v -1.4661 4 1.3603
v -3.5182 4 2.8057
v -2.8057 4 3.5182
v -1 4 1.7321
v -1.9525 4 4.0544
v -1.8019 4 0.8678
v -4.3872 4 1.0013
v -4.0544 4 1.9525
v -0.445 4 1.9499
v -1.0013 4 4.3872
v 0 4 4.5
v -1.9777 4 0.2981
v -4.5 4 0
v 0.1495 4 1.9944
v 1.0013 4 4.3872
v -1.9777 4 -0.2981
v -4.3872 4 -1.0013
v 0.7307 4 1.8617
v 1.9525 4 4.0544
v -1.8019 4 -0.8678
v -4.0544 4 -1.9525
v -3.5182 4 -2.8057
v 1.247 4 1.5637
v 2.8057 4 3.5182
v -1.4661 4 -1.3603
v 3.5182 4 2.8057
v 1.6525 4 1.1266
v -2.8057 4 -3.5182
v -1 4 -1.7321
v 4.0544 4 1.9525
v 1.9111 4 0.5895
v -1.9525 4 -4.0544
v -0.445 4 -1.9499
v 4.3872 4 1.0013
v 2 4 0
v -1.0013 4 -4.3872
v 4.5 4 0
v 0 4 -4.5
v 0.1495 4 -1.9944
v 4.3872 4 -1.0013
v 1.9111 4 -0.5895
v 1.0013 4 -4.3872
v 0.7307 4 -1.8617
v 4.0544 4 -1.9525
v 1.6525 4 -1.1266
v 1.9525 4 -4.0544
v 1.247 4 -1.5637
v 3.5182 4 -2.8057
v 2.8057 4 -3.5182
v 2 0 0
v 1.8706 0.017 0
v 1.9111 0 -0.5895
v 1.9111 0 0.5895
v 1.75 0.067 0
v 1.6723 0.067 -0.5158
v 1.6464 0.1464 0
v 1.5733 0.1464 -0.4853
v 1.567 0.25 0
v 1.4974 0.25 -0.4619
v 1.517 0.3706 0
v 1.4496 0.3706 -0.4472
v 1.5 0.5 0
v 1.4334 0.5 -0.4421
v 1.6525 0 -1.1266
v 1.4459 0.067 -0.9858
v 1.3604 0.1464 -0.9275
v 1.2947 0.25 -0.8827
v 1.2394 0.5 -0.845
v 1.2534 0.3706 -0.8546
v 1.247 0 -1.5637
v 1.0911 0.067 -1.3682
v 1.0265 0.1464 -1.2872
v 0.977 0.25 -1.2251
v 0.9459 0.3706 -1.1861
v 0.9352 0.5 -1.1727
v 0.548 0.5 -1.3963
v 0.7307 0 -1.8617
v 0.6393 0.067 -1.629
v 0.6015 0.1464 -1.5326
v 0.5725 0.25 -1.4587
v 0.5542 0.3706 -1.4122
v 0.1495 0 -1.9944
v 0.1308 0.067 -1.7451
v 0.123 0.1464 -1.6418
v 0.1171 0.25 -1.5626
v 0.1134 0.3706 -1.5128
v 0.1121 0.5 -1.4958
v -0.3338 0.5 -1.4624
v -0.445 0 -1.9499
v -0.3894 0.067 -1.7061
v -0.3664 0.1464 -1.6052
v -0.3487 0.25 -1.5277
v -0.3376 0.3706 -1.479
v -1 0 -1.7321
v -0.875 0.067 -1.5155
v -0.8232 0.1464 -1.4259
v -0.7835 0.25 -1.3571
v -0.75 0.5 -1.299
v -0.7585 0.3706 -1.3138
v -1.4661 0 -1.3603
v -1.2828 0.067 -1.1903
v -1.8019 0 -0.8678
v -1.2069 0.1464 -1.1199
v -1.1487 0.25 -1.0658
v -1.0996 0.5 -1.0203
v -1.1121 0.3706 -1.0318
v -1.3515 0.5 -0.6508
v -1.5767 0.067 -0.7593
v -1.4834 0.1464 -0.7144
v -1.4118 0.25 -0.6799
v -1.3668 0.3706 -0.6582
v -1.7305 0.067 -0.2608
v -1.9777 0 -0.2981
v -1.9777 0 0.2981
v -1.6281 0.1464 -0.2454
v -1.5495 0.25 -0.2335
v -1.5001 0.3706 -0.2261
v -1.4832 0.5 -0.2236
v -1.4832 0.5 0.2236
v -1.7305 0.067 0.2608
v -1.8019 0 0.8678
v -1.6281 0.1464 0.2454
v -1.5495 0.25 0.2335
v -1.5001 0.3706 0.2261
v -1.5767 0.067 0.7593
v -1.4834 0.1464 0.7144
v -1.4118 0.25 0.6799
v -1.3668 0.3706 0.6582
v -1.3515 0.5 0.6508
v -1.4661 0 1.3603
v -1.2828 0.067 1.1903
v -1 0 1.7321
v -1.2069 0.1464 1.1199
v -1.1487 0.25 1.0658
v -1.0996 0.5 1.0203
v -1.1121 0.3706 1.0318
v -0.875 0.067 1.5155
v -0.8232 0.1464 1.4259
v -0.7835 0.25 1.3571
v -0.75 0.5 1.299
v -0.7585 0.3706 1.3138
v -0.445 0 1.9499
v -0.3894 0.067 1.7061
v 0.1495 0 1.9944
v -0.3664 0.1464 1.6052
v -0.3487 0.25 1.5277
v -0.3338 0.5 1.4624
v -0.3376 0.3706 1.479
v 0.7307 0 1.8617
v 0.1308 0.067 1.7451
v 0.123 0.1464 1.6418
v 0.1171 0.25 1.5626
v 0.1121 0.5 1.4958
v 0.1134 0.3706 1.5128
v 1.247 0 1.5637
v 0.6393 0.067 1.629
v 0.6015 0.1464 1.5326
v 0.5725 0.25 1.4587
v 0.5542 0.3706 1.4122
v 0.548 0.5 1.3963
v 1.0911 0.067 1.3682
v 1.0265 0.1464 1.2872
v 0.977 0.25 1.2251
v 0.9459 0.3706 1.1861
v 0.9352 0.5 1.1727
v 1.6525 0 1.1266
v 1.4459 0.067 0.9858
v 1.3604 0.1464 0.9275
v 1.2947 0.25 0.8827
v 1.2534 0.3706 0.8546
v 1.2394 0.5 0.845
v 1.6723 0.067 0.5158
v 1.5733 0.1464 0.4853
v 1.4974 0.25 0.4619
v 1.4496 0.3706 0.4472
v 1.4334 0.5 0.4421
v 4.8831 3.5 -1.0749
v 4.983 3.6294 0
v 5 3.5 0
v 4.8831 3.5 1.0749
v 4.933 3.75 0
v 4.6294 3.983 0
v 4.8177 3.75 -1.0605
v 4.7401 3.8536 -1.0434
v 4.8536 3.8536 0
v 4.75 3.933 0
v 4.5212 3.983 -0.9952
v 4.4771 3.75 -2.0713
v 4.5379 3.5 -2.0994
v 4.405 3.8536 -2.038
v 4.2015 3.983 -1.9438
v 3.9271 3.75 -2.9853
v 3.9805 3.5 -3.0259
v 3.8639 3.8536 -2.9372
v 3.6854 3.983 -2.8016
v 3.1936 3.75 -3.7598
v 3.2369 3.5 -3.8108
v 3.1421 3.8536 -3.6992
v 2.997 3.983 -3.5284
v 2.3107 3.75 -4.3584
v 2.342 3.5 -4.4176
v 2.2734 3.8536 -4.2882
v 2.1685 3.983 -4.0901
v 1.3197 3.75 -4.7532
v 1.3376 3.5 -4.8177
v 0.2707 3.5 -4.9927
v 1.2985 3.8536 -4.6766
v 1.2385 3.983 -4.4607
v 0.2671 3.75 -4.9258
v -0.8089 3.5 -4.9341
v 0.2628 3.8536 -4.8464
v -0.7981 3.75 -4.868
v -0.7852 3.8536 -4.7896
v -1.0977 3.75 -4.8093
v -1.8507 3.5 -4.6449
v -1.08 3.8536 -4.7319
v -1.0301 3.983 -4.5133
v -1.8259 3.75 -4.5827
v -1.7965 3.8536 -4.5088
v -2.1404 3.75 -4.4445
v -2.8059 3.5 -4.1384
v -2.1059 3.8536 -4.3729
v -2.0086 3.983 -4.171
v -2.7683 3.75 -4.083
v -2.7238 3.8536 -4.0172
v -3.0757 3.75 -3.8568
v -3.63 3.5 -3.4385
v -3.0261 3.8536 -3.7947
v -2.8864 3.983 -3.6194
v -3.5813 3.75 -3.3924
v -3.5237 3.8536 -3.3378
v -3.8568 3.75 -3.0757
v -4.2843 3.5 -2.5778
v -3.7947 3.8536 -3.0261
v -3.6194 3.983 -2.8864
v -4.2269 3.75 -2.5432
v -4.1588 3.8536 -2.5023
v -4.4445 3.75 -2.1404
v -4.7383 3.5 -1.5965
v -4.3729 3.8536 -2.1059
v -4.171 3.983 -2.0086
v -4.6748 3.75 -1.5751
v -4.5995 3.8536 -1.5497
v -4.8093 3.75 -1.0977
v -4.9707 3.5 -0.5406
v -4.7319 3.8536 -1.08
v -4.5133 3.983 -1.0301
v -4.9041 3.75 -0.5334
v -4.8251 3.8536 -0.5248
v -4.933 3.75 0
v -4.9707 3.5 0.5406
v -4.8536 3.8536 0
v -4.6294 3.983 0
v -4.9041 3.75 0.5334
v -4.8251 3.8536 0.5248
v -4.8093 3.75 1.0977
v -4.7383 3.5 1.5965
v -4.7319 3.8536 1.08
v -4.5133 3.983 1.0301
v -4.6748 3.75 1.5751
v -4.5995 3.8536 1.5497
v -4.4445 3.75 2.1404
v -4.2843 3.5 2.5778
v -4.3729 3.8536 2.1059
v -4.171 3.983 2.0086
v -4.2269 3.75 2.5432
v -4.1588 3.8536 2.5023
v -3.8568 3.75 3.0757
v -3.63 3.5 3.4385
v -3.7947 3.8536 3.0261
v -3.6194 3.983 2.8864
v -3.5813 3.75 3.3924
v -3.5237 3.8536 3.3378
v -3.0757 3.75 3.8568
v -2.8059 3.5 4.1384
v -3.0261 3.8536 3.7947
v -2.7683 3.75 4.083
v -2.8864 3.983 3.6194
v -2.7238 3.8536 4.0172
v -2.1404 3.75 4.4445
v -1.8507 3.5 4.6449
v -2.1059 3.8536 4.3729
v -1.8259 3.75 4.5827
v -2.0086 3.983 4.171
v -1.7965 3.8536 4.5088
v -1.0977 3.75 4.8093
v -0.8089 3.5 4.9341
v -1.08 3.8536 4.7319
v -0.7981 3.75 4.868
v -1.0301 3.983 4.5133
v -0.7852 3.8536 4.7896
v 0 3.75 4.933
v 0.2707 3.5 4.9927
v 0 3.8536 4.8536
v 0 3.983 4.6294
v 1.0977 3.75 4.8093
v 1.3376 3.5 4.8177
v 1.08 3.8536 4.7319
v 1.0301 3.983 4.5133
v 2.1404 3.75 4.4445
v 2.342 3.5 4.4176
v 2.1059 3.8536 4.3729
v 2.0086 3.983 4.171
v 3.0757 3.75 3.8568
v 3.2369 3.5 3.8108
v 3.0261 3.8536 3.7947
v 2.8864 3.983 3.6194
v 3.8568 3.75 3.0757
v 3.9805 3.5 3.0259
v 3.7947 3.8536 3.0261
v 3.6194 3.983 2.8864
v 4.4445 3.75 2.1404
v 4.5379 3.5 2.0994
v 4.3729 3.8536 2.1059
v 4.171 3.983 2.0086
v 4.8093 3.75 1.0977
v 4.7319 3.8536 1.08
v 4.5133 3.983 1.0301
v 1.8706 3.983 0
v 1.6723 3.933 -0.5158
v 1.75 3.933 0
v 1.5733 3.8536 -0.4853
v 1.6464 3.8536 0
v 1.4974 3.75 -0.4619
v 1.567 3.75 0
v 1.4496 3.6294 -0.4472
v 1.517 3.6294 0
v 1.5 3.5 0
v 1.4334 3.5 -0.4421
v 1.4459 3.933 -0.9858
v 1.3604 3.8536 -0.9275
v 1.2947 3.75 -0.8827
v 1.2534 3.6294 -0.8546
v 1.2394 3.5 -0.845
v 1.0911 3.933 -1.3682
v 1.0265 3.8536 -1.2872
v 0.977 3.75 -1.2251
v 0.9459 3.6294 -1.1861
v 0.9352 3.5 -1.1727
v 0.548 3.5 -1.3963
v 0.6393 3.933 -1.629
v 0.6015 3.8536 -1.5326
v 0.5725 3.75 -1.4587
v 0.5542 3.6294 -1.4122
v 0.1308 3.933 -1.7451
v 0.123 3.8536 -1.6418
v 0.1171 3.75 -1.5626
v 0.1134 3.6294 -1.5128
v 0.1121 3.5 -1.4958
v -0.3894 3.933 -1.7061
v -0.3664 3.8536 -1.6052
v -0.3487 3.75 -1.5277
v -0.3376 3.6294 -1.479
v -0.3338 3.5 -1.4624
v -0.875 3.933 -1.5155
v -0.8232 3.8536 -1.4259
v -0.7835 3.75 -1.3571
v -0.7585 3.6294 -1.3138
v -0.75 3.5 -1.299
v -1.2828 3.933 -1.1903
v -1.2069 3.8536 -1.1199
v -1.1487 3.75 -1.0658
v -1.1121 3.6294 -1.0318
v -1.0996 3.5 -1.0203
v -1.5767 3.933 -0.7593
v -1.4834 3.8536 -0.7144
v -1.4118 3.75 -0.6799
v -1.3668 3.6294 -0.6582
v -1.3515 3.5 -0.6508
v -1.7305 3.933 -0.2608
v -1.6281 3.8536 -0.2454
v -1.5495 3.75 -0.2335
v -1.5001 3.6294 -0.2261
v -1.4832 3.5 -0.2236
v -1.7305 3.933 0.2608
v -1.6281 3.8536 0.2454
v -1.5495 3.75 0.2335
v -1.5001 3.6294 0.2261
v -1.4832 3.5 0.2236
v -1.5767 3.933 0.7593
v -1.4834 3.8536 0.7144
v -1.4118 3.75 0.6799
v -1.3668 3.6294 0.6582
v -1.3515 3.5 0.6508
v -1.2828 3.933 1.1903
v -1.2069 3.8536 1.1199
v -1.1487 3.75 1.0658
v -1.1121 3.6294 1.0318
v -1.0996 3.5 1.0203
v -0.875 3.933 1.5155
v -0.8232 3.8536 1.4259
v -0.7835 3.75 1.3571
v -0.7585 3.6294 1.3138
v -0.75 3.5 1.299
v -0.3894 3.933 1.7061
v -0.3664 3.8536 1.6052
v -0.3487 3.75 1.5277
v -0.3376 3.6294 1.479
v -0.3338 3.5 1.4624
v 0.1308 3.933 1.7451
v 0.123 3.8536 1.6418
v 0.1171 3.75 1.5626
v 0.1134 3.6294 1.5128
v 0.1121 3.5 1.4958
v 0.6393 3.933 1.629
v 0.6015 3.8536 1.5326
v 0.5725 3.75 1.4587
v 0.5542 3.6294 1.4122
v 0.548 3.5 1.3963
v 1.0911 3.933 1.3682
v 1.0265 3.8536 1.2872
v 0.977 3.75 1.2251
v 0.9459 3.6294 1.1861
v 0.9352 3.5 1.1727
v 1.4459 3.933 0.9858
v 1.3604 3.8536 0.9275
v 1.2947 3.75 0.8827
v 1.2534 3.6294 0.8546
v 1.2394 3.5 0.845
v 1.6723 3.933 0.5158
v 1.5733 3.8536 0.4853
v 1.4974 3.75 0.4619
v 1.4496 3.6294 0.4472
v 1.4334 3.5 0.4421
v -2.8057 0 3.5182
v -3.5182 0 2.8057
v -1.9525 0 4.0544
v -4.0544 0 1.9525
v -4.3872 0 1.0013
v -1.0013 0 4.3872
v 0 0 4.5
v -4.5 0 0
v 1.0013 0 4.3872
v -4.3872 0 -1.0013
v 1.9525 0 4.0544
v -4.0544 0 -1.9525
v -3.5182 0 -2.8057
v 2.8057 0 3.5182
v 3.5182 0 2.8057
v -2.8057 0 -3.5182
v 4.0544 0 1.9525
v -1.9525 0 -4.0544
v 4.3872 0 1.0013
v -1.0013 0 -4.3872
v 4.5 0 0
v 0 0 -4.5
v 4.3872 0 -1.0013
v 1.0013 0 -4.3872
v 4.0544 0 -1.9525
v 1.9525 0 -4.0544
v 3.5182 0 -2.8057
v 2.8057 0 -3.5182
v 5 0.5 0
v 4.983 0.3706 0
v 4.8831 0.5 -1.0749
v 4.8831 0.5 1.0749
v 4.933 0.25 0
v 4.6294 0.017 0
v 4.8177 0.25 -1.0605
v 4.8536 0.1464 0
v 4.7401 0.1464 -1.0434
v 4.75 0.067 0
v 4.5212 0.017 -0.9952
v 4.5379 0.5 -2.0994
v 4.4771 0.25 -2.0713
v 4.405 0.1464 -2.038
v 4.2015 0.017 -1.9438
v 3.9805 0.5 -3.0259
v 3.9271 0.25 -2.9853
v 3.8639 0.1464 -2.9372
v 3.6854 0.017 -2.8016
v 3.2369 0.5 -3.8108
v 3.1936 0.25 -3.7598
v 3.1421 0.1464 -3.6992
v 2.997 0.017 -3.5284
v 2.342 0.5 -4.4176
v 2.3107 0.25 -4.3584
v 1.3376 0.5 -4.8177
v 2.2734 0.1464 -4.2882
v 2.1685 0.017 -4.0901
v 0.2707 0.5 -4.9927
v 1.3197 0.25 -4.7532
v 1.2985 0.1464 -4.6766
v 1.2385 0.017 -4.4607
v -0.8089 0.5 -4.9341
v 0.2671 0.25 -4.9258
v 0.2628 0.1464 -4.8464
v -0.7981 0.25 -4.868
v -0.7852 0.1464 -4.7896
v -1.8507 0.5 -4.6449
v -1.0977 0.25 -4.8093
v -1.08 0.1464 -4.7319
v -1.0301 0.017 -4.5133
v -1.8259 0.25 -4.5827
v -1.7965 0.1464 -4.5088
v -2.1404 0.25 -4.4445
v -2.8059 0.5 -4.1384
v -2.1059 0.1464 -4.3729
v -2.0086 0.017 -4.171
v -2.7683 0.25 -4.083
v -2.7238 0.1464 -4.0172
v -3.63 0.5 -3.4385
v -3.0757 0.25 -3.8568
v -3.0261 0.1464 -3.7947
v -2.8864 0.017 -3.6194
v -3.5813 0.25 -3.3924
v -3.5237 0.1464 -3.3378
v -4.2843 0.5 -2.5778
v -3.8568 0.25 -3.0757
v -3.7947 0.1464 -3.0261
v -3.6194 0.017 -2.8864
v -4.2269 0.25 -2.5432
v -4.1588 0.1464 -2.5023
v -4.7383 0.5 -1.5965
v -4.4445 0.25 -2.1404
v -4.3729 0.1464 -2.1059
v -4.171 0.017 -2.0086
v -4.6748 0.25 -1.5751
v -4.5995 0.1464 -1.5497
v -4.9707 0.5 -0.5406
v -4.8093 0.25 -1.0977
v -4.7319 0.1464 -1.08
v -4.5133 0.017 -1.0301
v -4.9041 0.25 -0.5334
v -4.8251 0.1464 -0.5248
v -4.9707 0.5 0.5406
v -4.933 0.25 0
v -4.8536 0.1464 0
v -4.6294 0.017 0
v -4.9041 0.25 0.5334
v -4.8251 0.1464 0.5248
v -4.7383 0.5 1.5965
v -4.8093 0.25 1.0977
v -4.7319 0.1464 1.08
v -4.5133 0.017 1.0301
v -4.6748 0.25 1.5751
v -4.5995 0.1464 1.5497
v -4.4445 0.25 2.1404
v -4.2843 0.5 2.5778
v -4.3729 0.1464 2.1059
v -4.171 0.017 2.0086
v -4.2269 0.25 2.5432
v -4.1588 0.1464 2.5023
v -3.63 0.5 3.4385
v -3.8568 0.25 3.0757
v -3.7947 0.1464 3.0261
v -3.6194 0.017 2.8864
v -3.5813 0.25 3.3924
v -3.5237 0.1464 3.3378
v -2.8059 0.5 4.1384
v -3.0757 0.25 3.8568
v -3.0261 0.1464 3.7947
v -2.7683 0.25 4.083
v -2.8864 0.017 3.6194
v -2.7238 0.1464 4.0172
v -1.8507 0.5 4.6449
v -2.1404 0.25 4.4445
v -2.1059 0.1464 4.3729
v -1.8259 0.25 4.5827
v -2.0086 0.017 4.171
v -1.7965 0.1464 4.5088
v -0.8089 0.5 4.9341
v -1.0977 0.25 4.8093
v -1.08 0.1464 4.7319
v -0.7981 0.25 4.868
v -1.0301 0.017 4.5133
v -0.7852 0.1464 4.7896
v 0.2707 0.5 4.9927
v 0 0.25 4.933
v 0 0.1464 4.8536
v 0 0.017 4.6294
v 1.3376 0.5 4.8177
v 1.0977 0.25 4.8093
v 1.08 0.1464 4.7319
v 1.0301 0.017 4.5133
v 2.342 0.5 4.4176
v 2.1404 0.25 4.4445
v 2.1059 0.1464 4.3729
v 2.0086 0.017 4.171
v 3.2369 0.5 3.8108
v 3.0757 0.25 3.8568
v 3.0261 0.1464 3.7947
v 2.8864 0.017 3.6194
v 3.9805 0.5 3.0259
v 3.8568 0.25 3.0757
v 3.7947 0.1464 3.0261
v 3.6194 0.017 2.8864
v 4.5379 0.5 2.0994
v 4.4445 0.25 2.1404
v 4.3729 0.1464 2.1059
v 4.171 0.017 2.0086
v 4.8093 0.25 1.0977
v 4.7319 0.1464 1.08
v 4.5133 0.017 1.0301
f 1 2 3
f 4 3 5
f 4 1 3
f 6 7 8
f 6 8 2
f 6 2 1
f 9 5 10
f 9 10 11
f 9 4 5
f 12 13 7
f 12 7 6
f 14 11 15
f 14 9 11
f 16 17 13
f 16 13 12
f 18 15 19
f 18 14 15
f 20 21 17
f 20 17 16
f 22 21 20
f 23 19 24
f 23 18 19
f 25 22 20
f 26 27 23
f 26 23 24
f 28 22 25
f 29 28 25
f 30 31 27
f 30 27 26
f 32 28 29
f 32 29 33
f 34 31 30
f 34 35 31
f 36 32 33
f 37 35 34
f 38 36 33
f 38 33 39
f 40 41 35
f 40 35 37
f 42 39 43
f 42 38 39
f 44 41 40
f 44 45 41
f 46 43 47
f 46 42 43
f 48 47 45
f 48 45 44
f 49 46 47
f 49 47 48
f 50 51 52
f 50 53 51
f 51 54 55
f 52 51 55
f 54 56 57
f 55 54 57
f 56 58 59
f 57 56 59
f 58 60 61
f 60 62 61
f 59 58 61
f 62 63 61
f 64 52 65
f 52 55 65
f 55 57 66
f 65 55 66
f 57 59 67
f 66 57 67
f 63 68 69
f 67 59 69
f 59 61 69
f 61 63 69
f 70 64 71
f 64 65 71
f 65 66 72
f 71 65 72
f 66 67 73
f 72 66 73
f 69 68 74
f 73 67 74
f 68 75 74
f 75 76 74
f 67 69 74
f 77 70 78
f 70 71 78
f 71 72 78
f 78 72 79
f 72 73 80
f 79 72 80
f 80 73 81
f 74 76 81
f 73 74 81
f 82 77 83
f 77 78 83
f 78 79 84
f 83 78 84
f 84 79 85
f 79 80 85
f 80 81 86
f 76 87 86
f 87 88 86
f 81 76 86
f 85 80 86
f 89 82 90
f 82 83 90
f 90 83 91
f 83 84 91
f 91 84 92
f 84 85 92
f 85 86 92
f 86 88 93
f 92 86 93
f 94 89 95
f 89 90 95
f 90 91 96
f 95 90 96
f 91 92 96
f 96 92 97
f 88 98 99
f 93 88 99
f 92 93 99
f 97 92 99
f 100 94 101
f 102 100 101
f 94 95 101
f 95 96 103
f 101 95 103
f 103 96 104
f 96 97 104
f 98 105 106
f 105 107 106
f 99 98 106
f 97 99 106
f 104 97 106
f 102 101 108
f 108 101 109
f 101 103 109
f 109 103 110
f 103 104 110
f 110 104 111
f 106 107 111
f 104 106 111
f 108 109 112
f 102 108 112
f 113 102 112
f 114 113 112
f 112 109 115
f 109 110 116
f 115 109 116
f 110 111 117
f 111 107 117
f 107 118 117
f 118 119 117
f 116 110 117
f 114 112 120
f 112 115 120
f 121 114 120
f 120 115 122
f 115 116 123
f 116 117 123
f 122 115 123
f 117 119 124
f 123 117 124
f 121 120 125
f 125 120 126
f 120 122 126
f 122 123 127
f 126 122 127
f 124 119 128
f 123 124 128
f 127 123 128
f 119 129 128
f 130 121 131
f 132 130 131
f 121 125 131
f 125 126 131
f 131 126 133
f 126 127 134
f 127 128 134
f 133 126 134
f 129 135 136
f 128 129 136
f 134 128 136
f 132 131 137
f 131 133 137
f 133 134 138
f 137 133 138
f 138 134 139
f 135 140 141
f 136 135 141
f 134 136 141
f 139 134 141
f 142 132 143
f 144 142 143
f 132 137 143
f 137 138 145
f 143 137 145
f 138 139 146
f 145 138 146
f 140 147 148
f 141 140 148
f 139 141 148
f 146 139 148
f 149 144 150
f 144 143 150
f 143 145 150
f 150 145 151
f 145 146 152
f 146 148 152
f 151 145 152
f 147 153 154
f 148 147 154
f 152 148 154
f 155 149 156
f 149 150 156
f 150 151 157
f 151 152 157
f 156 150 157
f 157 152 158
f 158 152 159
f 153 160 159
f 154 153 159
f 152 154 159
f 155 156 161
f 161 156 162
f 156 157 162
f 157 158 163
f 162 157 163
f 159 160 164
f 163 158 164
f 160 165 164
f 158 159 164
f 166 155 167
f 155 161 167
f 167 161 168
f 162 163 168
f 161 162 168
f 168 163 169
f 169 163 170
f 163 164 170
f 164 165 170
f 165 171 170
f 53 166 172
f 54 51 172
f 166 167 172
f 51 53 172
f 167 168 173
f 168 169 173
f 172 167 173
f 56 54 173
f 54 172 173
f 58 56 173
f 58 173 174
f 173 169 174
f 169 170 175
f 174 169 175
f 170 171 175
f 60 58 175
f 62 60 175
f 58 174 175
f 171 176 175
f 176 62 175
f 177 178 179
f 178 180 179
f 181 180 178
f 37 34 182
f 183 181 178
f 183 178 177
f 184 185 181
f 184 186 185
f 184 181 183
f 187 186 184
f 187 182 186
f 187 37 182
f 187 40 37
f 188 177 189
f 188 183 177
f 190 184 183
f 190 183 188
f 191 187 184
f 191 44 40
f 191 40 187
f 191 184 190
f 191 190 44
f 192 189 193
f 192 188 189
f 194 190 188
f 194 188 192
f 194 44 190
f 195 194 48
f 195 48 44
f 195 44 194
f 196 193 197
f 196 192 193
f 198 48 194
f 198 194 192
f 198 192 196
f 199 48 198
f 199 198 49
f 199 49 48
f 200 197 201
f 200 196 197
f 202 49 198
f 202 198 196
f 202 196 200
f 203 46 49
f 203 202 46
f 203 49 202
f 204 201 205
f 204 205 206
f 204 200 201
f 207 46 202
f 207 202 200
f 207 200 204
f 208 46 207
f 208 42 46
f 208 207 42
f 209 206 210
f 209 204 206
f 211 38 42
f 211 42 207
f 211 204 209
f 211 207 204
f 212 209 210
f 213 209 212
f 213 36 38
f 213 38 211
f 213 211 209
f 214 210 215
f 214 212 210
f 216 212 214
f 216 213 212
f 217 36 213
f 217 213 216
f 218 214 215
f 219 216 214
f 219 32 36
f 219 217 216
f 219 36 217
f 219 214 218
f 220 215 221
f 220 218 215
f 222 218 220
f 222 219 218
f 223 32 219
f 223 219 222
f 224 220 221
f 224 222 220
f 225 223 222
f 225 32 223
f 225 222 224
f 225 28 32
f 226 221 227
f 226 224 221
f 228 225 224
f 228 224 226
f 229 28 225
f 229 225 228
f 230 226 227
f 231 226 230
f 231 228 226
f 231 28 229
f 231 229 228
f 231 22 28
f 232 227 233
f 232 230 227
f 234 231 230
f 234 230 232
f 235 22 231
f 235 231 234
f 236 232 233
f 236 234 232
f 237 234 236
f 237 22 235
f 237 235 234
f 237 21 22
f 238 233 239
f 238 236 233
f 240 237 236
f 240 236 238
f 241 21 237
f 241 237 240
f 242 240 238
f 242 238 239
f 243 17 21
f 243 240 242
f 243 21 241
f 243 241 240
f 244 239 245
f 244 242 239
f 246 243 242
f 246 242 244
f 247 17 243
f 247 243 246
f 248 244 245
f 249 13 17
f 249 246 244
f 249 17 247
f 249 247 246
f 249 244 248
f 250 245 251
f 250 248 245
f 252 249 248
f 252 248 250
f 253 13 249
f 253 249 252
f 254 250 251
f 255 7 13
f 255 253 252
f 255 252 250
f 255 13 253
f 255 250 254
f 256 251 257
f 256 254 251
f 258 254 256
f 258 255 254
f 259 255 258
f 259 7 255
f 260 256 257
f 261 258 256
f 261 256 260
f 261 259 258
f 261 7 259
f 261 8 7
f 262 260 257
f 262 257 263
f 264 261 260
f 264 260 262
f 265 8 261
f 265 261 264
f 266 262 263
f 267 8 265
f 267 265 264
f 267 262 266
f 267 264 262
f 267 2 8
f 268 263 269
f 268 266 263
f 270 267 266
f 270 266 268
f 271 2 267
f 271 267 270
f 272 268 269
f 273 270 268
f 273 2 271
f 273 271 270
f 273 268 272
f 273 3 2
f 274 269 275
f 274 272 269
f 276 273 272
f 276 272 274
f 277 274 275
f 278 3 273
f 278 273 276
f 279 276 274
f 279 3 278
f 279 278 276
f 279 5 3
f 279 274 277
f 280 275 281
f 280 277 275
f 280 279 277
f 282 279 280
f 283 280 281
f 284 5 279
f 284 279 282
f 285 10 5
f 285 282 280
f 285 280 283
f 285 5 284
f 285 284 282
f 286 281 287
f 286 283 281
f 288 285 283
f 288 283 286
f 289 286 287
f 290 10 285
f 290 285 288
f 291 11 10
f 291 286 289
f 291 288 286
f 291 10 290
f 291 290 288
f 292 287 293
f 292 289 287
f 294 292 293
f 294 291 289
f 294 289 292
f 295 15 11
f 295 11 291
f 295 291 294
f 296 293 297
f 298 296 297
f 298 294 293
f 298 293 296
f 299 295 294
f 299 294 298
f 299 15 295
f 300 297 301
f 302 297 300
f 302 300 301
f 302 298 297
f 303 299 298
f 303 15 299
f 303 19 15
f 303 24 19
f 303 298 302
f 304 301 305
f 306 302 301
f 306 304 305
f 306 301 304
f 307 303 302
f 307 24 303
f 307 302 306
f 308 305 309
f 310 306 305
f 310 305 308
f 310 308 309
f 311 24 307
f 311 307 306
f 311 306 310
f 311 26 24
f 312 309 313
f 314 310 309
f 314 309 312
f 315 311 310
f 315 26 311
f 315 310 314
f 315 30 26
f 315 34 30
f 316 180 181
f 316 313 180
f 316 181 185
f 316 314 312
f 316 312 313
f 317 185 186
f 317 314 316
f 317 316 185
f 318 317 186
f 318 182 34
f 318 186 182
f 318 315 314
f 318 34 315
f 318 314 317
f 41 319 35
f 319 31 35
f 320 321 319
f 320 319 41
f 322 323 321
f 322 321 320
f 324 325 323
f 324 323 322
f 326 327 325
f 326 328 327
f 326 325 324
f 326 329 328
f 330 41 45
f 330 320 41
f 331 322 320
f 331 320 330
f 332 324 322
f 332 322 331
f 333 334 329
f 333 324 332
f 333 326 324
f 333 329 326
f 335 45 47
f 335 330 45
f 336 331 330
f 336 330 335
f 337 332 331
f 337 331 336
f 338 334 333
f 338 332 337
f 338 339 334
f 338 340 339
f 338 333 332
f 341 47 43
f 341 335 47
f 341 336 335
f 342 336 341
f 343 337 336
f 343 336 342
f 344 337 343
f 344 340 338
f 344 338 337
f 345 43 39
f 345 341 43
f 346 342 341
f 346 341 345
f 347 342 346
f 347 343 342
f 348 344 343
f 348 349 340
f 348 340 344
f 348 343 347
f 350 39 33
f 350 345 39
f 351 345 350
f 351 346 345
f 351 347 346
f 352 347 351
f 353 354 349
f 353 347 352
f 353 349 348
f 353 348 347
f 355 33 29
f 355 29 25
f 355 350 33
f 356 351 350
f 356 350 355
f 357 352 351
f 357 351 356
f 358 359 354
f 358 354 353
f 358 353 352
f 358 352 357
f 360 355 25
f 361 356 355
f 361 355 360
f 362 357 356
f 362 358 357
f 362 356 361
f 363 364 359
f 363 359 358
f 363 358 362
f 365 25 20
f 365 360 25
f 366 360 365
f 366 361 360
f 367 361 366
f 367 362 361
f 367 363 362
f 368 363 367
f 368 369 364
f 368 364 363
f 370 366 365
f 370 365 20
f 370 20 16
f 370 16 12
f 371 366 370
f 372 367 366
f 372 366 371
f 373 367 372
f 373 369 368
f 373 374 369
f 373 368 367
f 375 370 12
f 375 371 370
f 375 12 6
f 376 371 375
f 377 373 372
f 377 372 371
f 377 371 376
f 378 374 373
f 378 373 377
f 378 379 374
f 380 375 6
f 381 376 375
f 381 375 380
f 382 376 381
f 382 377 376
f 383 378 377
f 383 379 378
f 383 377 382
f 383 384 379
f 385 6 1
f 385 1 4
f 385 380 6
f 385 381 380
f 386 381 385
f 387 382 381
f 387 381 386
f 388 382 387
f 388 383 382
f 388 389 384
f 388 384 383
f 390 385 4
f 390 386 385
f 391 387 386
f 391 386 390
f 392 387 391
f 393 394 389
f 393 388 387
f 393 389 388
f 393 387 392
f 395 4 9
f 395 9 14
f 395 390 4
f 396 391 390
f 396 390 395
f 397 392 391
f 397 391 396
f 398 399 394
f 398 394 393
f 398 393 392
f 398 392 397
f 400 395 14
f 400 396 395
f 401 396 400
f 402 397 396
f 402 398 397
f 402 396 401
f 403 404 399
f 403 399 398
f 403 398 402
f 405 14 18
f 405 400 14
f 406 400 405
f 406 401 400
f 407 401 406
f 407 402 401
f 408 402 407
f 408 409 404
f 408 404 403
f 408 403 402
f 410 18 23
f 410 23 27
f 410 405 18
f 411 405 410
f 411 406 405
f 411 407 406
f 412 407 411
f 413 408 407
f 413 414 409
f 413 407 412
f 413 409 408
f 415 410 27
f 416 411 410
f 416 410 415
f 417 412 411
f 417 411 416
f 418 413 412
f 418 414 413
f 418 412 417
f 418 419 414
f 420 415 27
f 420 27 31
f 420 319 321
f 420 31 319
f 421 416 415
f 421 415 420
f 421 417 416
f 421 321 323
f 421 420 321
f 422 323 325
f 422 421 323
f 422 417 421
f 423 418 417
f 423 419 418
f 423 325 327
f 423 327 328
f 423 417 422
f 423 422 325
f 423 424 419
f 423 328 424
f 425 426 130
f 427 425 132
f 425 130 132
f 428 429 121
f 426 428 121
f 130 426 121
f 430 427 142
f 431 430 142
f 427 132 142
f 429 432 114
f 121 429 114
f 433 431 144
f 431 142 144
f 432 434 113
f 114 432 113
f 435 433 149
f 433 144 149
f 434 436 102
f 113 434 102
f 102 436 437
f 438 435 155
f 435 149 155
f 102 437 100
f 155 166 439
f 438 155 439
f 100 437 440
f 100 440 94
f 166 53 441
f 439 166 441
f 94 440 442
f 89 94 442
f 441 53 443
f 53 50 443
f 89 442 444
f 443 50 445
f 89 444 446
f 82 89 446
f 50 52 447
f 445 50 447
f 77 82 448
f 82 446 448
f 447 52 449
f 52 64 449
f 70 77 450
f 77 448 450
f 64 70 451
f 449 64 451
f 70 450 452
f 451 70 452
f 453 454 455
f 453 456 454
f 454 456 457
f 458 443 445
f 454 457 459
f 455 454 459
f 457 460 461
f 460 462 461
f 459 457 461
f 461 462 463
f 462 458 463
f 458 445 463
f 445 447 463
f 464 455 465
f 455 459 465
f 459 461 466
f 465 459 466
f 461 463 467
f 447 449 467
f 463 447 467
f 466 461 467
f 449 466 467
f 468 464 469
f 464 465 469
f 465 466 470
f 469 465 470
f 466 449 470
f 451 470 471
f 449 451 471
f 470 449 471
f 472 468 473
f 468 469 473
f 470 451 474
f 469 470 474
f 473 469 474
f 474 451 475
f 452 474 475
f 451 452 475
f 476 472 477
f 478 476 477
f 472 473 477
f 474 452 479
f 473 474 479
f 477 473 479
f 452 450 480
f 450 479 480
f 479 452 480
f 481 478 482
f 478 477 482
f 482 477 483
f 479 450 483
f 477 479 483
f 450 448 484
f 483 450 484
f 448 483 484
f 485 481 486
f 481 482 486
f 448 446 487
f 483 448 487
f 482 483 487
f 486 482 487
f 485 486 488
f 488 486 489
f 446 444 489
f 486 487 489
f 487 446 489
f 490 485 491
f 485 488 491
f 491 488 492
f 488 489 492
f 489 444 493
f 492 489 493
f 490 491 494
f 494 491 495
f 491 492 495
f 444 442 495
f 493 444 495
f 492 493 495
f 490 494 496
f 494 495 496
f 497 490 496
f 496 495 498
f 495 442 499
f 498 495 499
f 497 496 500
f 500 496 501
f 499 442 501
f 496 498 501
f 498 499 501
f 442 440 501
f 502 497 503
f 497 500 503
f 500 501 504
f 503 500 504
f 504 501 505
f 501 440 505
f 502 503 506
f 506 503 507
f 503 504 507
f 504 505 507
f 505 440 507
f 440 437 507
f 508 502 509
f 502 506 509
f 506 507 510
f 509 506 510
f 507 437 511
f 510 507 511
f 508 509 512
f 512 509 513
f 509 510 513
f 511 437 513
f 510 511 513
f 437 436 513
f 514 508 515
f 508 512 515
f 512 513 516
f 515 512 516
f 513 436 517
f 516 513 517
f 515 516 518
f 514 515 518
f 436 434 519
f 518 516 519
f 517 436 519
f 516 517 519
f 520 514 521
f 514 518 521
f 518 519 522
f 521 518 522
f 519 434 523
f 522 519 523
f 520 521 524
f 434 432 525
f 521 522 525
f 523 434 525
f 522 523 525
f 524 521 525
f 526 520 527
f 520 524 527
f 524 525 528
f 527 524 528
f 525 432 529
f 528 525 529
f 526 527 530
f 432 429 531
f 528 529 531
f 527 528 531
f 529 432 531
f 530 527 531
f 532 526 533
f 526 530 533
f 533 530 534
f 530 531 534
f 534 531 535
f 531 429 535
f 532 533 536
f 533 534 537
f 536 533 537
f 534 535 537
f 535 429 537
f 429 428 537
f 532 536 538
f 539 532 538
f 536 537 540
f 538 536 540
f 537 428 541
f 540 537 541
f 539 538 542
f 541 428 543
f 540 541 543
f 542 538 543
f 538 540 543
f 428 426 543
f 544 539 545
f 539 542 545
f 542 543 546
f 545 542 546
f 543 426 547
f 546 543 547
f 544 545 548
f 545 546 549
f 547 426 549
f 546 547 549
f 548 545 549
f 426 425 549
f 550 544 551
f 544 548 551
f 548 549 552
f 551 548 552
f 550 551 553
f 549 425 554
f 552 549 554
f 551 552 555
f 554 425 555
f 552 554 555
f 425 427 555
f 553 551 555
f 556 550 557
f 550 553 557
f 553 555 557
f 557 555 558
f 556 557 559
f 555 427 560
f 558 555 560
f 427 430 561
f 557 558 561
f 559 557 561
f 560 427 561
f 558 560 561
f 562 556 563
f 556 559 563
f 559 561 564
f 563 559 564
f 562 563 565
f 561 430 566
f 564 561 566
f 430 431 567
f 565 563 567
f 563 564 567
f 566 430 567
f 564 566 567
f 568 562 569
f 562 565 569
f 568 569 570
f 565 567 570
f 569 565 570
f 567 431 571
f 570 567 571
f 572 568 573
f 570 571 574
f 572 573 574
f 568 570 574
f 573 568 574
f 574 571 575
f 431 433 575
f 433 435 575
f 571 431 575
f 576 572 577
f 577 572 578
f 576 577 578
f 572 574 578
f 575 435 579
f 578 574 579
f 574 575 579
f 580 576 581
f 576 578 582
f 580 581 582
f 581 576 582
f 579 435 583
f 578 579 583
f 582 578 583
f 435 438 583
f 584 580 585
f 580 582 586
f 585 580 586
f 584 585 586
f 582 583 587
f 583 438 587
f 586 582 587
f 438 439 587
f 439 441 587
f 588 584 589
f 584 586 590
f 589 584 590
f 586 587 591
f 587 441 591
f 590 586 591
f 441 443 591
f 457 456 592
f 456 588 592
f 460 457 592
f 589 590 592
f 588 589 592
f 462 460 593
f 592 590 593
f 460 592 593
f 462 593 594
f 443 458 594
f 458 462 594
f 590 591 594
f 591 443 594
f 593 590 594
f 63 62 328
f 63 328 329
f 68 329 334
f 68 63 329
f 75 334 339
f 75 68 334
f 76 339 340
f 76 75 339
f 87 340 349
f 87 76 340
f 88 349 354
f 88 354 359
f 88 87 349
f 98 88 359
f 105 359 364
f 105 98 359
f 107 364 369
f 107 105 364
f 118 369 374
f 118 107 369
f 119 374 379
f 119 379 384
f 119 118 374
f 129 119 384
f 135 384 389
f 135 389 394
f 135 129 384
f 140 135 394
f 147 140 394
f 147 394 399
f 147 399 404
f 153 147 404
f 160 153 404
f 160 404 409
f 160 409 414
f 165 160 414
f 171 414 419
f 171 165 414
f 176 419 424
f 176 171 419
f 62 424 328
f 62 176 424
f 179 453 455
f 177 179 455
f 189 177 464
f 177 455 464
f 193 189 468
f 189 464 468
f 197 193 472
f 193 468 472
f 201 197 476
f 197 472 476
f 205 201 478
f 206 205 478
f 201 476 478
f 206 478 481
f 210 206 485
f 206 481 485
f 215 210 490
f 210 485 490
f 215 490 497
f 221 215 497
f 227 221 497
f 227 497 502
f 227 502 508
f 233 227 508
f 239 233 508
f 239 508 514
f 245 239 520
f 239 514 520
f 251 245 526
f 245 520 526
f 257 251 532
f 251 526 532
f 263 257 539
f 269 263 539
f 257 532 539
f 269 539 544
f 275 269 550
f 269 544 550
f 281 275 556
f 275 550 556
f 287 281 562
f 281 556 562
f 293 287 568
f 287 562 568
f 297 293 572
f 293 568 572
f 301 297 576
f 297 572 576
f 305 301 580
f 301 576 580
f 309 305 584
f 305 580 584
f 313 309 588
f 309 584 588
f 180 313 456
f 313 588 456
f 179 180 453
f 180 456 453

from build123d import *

# Parameters (mm, degrees)
SKETCH2_R           = 5
SKETCH2_R_2         = 1.5
BOSS_EXTRUDE1_DEPTH = 4
FILLET1_R           = 0.5
FILLET2_R           = 0.5


with BuildPart() as part:
    # Sketch2 → Boss-Extrude1 (new body)
    with BuildSketch(Plane(origin=(0, 0, 0), x_dir=(1, 0, 0), z_dir=(0, 1, 0))):
        Circle(SKETCH2_R)
        Circle(SKETCH2_R_2, mode=Mode.SUBTRACT)
    extrude(amount=BOSS_EXTRUDE1_DEPTH)

    # Fillet1
    fillet1_edges = [part.edges().sort_by_distance(p)[0] for p in [
        (-5, 0, 0),
        (-5, 4, 0),
    ]]
    fillet(fillet1_edges, radius=FILLET1_R)

    # Fillet2
    fillet2_edges = [part.edges().sort_by_distance(p)[0] for p in [
        (-1.5, 0, 0),
        (-1.5, 4, 0),
    ]]
    fillet(fillet2_edges, radius=FILLET2_R)


solid = part.part
